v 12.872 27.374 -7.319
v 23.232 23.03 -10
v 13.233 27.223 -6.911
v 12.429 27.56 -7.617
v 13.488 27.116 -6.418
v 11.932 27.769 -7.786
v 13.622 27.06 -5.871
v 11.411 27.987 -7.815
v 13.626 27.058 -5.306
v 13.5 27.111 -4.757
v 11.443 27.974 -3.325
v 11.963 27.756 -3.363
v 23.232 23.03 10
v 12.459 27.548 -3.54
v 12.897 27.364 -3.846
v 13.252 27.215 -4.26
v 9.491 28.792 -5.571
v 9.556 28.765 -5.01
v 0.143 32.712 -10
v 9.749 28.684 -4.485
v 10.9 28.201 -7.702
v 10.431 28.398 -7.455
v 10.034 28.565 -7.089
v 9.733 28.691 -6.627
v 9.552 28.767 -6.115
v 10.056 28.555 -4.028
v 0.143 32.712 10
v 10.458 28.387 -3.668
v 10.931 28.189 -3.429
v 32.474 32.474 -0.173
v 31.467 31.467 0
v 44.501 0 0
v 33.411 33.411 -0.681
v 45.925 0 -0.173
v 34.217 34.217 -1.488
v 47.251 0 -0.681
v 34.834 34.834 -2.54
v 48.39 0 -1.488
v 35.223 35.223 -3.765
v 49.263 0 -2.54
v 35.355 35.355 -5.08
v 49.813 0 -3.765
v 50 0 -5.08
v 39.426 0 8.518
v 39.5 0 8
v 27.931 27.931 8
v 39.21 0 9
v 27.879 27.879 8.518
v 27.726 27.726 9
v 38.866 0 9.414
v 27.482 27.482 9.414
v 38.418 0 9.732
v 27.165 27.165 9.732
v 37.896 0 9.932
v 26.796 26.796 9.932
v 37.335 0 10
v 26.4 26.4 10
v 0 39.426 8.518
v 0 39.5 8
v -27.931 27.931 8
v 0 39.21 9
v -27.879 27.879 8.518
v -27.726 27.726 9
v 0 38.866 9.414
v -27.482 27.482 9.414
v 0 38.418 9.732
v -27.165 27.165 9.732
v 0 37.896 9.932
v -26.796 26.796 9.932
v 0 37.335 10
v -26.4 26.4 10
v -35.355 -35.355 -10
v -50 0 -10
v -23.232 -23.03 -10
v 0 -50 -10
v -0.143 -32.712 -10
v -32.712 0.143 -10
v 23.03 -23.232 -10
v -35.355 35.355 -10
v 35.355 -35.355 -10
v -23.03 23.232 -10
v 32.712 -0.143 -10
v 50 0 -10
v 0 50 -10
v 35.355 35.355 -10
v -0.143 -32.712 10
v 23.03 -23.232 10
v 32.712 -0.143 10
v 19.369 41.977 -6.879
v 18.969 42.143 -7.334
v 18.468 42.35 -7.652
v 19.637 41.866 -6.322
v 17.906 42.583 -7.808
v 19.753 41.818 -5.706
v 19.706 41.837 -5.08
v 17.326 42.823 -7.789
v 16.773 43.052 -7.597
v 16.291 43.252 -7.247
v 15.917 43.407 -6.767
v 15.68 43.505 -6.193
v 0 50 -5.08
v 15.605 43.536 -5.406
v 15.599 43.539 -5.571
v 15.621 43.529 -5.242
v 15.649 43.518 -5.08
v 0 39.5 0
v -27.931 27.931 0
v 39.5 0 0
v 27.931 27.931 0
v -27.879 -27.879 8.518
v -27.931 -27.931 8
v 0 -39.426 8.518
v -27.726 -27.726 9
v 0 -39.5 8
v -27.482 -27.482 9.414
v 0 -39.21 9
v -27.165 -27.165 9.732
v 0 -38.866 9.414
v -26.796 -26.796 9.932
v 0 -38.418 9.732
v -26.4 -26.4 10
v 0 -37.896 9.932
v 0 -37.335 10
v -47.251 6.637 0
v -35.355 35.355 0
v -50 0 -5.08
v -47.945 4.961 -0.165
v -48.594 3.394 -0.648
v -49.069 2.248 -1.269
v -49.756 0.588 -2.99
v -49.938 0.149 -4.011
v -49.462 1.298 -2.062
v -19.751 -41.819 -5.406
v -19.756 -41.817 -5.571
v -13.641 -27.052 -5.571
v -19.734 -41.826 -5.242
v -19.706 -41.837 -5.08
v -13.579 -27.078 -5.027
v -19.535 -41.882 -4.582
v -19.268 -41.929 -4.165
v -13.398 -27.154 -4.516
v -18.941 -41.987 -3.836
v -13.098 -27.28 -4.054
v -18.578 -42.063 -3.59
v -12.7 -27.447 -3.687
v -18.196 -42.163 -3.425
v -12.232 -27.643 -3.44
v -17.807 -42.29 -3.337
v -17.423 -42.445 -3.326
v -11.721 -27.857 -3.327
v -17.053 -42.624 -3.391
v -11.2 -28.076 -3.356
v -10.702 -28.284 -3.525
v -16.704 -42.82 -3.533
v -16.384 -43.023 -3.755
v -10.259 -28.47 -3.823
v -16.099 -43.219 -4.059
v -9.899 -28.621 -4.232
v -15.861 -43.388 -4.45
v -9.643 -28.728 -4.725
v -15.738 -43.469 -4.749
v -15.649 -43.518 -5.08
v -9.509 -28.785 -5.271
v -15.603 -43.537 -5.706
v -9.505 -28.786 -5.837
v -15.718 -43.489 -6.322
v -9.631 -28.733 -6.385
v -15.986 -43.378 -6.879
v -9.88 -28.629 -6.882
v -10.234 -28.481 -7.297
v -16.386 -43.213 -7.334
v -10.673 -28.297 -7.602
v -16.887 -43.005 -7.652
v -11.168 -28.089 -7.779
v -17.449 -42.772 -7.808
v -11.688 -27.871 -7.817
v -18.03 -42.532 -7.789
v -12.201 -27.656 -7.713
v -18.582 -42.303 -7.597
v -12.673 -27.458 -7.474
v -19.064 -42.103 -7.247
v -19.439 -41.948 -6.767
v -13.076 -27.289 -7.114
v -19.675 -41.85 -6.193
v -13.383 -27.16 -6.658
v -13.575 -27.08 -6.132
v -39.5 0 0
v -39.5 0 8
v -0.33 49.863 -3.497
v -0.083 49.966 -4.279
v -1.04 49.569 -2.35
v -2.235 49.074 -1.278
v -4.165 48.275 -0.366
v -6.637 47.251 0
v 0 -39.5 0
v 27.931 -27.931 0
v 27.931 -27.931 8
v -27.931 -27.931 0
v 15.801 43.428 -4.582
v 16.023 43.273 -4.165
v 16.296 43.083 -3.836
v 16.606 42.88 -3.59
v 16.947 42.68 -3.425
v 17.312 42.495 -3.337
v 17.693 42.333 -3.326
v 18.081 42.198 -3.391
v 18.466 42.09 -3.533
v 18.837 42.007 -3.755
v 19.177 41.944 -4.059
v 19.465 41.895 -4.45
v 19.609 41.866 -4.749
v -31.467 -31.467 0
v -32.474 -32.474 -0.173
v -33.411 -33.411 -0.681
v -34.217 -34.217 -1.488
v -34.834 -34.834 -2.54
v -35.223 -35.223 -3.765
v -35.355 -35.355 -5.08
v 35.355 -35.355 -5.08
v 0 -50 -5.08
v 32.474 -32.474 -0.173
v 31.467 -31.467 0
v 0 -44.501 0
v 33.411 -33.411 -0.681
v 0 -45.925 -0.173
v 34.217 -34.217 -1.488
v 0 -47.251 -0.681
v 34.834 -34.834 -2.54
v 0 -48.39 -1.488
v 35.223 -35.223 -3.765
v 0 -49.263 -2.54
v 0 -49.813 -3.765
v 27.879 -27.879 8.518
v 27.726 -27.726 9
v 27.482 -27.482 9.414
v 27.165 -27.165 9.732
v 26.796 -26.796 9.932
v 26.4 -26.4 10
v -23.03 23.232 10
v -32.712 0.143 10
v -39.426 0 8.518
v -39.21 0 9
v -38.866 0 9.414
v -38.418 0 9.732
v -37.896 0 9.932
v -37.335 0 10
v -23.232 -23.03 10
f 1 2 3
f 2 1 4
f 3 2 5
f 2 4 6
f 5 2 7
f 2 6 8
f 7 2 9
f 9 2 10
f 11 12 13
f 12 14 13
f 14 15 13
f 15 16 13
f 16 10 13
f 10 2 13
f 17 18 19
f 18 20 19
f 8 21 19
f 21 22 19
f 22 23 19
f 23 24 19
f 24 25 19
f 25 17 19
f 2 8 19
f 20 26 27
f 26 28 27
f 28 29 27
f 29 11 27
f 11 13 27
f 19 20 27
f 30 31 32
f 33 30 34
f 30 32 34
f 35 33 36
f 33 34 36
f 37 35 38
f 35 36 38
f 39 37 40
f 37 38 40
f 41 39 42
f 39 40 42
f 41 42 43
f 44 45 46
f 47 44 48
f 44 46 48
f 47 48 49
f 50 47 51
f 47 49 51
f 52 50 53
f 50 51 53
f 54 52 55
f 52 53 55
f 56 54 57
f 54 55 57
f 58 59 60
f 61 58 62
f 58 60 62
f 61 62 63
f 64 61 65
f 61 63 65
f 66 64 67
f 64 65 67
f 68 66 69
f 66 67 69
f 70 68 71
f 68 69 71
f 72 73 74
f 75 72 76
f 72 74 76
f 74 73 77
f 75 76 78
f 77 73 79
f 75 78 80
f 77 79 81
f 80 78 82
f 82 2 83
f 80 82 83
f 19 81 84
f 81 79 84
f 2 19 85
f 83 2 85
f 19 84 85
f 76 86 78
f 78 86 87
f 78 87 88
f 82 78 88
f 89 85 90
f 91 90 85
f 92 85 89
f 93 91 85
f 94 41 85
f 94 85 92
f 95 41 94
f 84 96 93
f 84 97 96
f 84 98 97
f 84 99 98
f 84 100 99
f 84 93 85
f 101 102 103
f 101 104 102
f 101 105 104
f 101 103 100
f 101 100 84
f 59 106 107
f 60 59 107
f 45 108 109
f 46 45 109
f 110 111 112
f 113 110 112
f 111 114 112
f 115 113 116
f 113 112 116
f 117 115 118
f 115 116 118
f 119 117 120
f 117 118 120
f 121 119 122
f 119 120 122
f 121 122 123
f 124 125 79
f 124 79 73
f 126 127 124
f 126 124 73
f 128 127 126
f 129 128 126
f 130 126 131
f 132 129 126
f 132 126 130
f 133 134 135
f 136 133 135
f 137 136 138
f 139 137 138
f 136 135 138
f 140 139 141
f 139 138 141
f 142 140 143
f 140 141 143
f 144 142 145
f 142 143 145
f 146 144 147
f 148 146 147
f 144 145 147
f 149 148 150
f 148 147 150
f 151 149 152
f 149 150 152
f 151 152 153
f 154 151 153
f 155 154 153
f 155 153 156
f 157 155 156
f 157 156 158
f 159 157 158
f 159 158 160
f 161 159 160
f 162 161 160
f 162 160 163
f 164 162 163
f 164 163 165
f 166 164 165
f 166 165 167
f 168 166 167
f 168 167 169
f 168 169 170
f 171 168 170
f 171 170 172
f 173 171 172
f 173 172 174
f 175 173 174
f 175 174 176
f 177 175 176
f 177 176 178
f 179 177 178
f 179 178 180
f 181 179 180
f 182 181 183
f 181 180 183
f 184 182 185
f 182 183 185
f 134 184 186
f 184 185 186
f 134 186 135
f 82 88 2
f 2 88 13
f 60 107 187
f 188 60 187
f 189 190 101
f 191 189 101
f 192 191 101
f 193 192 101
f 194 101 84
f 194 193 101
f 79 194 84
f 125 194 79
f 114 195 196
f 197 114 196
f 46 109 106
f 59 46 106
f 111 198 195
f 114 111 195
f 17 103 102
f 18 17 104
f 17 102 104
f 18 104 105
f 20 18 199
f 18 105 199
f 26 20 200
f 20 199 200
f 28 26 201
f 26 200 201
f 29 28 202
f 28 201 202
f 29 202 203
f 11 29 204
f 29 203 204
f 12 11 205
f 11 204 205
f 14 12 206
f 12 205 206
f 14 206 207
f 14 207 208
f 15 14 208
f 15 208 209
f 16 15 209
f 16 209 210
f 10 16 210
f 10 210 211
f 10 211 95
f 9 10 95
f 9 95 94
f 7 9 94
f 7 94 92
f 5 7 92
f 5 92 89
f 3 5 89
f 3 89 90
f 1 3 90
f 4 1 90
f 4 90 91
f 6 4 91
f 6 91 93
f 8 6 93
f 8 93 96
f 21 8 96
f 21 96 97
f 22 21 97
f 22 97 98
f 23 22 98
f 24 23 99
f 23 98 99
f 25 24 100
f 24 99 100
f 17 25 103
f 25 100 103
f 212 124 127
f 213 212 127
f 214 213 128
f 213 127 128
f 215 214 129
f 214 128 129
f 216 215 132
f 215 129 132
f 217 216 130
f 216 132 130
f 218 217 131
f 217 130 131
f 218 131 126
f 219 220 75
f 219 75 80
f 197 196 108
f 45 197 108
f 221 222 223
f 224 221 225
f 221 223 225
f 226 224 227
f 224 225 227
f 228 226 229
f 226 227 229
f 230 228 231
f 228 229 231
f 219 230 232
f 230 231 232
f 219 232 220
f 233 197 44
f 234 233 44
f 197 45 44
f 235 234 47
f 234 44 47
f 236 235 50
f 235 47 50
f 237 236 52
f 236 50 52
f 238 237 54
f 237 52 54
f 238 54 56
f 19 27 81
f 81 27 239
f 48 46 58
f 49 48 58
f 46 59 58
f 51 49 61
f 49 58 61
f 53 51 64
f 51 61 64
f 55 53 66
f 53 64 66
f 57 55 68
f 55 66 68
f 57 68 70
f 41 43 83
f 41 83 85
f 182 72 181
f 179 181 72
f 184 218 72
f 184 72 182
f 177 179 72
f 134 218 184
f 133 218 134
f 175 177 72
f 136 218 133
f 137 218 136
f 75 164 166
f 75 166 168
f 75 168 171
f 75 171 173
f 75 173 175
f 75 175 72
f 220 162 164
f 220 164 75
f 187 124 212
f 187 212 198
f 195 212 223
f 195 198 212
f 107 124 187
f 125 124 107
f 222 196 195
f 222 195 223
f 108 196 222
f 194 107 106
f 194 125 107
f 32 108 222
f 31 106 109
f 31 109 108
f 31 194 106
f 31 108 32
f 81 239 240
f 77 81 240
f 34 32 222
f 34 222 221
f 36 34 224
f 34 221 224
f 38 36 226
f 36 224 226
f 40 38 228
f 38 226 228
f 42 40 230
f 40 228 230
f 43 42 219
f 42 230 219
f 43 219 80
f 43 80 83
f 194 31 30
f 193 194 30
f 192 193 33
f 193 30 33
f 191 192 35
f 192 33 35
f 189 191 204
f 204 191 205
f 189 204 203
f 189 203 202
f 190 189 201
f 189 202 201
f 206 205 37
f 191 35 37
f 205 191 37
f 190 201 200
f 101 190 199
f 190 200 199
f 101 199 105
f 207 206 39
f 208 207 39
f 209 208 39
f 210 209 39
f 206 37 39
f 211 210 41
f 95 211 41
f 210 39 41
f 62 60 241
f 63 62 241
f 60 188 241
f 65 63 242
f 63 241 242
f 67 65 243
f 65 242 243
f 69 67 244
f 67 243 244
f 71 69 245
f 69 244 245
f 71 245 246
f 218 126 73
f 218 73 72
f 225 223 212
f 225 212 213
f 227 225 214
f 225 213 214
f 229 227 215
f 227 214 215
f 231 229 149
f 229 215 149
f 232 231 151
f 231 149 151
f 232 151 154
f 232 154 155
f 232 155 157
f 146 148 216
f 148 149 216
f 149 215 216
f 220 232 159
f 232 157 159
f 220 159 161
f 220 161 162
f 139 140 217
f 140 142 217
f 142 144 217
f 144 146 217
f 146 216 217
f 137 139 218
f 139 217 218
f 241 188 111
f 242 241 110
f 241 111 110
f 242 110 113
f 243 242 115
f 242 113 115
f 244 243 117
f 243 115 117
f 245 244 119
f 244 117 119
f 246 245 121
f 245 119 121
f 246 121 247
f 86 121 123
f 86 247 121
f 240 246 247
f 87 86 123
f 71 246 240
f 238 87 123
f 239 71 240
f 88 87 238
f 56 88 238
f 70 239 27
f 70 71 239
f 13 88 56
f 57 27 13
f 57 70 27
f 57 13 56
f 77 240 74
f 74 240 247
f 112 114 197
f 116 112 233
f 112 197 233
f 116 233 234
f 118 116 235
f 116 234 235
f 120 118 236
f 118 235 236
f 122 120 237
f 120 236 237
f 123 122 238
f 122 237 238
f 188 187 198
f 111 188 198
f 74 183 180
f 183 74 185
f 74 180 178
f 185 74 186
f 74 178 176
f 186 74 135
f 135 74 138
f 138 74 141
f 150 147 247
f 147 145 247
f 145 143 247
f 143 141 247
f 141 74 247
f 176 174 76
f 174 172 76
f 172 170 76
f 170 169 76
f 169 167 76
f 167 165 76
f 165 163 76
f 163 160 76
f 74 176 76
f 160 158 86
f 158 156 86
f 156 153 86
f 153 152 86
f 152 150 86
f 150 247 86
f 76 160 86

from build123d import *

# Parameters (mm, degrees)
F1_DEPTH     = 10
F3_DEPTH     = 10
F5_DEPTH     = 23.6474
F6_R         = 2.25
F7_DEPTH     = 107.696
F8_R         = 2
F9_T1_DEPTH  = 63.6683432365
F9_T3_DEPTH  = 63.6683432365
F9_T5_DEPTH  = 63.6683432365
F9_T7_DEPTH  = 63.6683432365
F9_T9_DEPTH  = 63.6683432365
F9_T11_DEPTH = 63.6683432365


# Not quite as in the source:
# - a fillet or chamfer that OpenCascade refuses, or shapes differently, is made with other operations: its cross-section is extruded or revolved along the edge and cut away or added


with BuildPart() as f1:
    # F0 (on Top) → F1 (new body)
    with BuildSketch(Plane.XY):
        Polygon((50, 0), (35.3553390593, 35.3553390593), (0, 50), (-35.3553390593, 35.3553390593), (-50, 0), (-35.3553390593, -35.3553390593), (0, -50), (35.3553390593, -35.3553390593), align=None)
    extrude(amount=-F1_DEPTH)

    # F2 (on face) → F3 (join)
    with BuildSketch(Plane.XY):
        Polygon((-27.9307178569, -27.9307178569), (0, -39.5), (27.9307178569, -27.9307178569), (39.5, 0), (27.9307178569, 27.9307178569), (0, 39.5), (-27.9307178569, 27.9307178569), (-39.5, 0), align=None)
    extrude(amount=F3_DEPTH)

    # F4 (on face) → F5 (cut)
    with BuildSketch(Plane.XY.offset(10)):
        Polygon((-32.7123950097, 0.1427250341), (-23.2320781797, -23.0302345008), (-0.1427250341, -32.7123950097), (23.0302345008, -23.2320781797), (32.7123950097, -0.1427250341), (23.2320781797, 23.0302345008), (0.1427250341, 32.7123950097), (-23.0302345008, 23.2320781797), align=None)
    extrude(amount=-F5_DEPTH, mode=Mode.SUBTRACT)

    # F6 (on face) → F7 (cut)
    with BuildSketch(Plane(origin=(17.6776695297, 42.6776695297, 0), x_dir=(-0.9238795325, 0.3826834324, 0), z_dir=(0.3826834324, 0.9238795325, 0))):
        with Locations((0, -5.5711902678)):
            Circle(F6_R)
    extrude(amount=-F7_DEPTH, mode=Mode.SUBTRACT)

    # F8
    f8_edges = [f1.edges().sort_by_distance(p)[0] for p in [
        (33.715359, 13.965359, 10),
        (33.715359, -13.965359, 10),
        (13.965359, -33.715359, 10),
        (-13.965359, -33.715359, 10),
        (-33.715359, -13.965359, 10),
        (-33.715359, 13.965359, 10),
        (-13.965359, 33.715359, 10),
        (13.965359, 33.715359, 10),
    ]]
    fillet(f8_edges, radius=F8_R)

    # F9: fillet of radius 5.08 on 6 edges, made by hand

    # F9_s2 → F9_t1 (cut)
    with BuildSketch(Plane(origin=(-12.1824100614, -29.4109395926, 0), x_dir=(0, 0, 1), z_dir=(0.3826834324, 0.9238795325, 0))):
        with BuildLine():
            ThreePointArc((0, 41.1139766256), (-1.4878975516, 44.706079074), (-5.08, 46.1939766256))
            Line((-5.08, 46.1939766256), (0, 46.1939766256))
            Line((0, 46.1939766256), (0, 41.1139766256))
        make_face()
    extrude(amount=F9_T1_DEPTH, mode=Mode.SUBTRACT)

    # F9_s4 → F9_t3 (cut)
    with BuildSketch(Plane(origin=(-29.4109395926, -12.1824100614, 0), x_dir=(0, 0, 1), z_dir=(0.9238795325, 0.3826834324, 0))):
        with BuildLine():
            ThreePointArc((0, 41.1139766256), (-1.4878975516, 44.706079074), (-5.08, 46.1939766256))
            Line((-5.08, 46.1939766256), (0, 46.1939766256))
            Line((0, 46.1939766256), (0, 41.1139766256))
        make_face()
    extrude(amount=F9_T3_DEPTH, mode=Mode.SUBTRACT)

    # F9_s6 → F9_t5 (cut)
    with BuildSketch(Plane(origin=(-29.4109395926, 12.1824100614, 0), x_dir=(0, 0, 1), z_dir=(0.9238795325, -0.3826834324, 0))):
        with BuildLine():
            ThreePointArc((0, 41.1139766256), (-1.4878975516, 44.706079074), (-5.08, 46.1939766256))
            Line((-5.08, 46.1939766256), (0, 46.1939766256))
            Line((0, 46.1939766256), (0, 41.1139766256))
        make_face()
    extrude(amount=F9_T5_DEPTH, mode=Mode.SUBTRACT)

    # F9_s8 → F9_t7 (cut)
    with BuildSketch(Plane(origin=(12.1824100614, -29.4109395926, 0), x_dir=(0, 0, 1), z_dir=(-0.3826834324, 0.9238795325, 0))):
        with BuildLine():
            ThreePointArc((0, 41.1139766256), (-1.4878975516, 44.706079074), (-5.08, 46.1939766256))
            Line((-5.08, 46.1939766256), (0, 46.1939766256))
            Line((0, 46.1939766256), (0, 41.1139766256))
        make_face()
    extrude(amount=F9_T7_DEPTH, mode=Mode.SUBTRACT)

    # F9_s10 → F9_t9 (cut)
    with BuildSketch(Plane(origin=(-12.1824100614, 29.4109395926, 0), x_dir=(0, 0, 1), z_dir=(0.3826834324, -0.9238795325, 0))):
        with BuildLine():
            ThreePointArc((0, 41.1139766256), (-1.4878975516, 44.706079074), (-5.08, 46.1939766256))
            Line((-5.08, 46.1939766256), (0, 46.1939766256))
            Line((0, 46.1939766256), (0, 41.1139766256))
        make_face()
    extrude(amount=F9_T9_DEPTH, mode=Mode.SUBTRACT)

    # F9_s12 → F9_t11 (cut)
    with BuildSketch(Plane(origin=(29.4109395926, -12.1824100614, 0), x_dir=(0, 0, 1), z_dir=(-0.9238795325, 0.3826834324, 0))):
        with BuildLine():
            ThreePointArc((0, 41.1139766256), (-1.4878975516, 44.706079074), (-5.08, 46.1939766256))
            Line((-5.08, 46.1939766256), (0, 46.1939766256))
            Line((0, 46.1939766256), (0, 41.1139766256))
        make_face()
    extrude(amount=F9_T11_DEPTH, mode=Mode.SUBTRACT)


solid = f1.part
